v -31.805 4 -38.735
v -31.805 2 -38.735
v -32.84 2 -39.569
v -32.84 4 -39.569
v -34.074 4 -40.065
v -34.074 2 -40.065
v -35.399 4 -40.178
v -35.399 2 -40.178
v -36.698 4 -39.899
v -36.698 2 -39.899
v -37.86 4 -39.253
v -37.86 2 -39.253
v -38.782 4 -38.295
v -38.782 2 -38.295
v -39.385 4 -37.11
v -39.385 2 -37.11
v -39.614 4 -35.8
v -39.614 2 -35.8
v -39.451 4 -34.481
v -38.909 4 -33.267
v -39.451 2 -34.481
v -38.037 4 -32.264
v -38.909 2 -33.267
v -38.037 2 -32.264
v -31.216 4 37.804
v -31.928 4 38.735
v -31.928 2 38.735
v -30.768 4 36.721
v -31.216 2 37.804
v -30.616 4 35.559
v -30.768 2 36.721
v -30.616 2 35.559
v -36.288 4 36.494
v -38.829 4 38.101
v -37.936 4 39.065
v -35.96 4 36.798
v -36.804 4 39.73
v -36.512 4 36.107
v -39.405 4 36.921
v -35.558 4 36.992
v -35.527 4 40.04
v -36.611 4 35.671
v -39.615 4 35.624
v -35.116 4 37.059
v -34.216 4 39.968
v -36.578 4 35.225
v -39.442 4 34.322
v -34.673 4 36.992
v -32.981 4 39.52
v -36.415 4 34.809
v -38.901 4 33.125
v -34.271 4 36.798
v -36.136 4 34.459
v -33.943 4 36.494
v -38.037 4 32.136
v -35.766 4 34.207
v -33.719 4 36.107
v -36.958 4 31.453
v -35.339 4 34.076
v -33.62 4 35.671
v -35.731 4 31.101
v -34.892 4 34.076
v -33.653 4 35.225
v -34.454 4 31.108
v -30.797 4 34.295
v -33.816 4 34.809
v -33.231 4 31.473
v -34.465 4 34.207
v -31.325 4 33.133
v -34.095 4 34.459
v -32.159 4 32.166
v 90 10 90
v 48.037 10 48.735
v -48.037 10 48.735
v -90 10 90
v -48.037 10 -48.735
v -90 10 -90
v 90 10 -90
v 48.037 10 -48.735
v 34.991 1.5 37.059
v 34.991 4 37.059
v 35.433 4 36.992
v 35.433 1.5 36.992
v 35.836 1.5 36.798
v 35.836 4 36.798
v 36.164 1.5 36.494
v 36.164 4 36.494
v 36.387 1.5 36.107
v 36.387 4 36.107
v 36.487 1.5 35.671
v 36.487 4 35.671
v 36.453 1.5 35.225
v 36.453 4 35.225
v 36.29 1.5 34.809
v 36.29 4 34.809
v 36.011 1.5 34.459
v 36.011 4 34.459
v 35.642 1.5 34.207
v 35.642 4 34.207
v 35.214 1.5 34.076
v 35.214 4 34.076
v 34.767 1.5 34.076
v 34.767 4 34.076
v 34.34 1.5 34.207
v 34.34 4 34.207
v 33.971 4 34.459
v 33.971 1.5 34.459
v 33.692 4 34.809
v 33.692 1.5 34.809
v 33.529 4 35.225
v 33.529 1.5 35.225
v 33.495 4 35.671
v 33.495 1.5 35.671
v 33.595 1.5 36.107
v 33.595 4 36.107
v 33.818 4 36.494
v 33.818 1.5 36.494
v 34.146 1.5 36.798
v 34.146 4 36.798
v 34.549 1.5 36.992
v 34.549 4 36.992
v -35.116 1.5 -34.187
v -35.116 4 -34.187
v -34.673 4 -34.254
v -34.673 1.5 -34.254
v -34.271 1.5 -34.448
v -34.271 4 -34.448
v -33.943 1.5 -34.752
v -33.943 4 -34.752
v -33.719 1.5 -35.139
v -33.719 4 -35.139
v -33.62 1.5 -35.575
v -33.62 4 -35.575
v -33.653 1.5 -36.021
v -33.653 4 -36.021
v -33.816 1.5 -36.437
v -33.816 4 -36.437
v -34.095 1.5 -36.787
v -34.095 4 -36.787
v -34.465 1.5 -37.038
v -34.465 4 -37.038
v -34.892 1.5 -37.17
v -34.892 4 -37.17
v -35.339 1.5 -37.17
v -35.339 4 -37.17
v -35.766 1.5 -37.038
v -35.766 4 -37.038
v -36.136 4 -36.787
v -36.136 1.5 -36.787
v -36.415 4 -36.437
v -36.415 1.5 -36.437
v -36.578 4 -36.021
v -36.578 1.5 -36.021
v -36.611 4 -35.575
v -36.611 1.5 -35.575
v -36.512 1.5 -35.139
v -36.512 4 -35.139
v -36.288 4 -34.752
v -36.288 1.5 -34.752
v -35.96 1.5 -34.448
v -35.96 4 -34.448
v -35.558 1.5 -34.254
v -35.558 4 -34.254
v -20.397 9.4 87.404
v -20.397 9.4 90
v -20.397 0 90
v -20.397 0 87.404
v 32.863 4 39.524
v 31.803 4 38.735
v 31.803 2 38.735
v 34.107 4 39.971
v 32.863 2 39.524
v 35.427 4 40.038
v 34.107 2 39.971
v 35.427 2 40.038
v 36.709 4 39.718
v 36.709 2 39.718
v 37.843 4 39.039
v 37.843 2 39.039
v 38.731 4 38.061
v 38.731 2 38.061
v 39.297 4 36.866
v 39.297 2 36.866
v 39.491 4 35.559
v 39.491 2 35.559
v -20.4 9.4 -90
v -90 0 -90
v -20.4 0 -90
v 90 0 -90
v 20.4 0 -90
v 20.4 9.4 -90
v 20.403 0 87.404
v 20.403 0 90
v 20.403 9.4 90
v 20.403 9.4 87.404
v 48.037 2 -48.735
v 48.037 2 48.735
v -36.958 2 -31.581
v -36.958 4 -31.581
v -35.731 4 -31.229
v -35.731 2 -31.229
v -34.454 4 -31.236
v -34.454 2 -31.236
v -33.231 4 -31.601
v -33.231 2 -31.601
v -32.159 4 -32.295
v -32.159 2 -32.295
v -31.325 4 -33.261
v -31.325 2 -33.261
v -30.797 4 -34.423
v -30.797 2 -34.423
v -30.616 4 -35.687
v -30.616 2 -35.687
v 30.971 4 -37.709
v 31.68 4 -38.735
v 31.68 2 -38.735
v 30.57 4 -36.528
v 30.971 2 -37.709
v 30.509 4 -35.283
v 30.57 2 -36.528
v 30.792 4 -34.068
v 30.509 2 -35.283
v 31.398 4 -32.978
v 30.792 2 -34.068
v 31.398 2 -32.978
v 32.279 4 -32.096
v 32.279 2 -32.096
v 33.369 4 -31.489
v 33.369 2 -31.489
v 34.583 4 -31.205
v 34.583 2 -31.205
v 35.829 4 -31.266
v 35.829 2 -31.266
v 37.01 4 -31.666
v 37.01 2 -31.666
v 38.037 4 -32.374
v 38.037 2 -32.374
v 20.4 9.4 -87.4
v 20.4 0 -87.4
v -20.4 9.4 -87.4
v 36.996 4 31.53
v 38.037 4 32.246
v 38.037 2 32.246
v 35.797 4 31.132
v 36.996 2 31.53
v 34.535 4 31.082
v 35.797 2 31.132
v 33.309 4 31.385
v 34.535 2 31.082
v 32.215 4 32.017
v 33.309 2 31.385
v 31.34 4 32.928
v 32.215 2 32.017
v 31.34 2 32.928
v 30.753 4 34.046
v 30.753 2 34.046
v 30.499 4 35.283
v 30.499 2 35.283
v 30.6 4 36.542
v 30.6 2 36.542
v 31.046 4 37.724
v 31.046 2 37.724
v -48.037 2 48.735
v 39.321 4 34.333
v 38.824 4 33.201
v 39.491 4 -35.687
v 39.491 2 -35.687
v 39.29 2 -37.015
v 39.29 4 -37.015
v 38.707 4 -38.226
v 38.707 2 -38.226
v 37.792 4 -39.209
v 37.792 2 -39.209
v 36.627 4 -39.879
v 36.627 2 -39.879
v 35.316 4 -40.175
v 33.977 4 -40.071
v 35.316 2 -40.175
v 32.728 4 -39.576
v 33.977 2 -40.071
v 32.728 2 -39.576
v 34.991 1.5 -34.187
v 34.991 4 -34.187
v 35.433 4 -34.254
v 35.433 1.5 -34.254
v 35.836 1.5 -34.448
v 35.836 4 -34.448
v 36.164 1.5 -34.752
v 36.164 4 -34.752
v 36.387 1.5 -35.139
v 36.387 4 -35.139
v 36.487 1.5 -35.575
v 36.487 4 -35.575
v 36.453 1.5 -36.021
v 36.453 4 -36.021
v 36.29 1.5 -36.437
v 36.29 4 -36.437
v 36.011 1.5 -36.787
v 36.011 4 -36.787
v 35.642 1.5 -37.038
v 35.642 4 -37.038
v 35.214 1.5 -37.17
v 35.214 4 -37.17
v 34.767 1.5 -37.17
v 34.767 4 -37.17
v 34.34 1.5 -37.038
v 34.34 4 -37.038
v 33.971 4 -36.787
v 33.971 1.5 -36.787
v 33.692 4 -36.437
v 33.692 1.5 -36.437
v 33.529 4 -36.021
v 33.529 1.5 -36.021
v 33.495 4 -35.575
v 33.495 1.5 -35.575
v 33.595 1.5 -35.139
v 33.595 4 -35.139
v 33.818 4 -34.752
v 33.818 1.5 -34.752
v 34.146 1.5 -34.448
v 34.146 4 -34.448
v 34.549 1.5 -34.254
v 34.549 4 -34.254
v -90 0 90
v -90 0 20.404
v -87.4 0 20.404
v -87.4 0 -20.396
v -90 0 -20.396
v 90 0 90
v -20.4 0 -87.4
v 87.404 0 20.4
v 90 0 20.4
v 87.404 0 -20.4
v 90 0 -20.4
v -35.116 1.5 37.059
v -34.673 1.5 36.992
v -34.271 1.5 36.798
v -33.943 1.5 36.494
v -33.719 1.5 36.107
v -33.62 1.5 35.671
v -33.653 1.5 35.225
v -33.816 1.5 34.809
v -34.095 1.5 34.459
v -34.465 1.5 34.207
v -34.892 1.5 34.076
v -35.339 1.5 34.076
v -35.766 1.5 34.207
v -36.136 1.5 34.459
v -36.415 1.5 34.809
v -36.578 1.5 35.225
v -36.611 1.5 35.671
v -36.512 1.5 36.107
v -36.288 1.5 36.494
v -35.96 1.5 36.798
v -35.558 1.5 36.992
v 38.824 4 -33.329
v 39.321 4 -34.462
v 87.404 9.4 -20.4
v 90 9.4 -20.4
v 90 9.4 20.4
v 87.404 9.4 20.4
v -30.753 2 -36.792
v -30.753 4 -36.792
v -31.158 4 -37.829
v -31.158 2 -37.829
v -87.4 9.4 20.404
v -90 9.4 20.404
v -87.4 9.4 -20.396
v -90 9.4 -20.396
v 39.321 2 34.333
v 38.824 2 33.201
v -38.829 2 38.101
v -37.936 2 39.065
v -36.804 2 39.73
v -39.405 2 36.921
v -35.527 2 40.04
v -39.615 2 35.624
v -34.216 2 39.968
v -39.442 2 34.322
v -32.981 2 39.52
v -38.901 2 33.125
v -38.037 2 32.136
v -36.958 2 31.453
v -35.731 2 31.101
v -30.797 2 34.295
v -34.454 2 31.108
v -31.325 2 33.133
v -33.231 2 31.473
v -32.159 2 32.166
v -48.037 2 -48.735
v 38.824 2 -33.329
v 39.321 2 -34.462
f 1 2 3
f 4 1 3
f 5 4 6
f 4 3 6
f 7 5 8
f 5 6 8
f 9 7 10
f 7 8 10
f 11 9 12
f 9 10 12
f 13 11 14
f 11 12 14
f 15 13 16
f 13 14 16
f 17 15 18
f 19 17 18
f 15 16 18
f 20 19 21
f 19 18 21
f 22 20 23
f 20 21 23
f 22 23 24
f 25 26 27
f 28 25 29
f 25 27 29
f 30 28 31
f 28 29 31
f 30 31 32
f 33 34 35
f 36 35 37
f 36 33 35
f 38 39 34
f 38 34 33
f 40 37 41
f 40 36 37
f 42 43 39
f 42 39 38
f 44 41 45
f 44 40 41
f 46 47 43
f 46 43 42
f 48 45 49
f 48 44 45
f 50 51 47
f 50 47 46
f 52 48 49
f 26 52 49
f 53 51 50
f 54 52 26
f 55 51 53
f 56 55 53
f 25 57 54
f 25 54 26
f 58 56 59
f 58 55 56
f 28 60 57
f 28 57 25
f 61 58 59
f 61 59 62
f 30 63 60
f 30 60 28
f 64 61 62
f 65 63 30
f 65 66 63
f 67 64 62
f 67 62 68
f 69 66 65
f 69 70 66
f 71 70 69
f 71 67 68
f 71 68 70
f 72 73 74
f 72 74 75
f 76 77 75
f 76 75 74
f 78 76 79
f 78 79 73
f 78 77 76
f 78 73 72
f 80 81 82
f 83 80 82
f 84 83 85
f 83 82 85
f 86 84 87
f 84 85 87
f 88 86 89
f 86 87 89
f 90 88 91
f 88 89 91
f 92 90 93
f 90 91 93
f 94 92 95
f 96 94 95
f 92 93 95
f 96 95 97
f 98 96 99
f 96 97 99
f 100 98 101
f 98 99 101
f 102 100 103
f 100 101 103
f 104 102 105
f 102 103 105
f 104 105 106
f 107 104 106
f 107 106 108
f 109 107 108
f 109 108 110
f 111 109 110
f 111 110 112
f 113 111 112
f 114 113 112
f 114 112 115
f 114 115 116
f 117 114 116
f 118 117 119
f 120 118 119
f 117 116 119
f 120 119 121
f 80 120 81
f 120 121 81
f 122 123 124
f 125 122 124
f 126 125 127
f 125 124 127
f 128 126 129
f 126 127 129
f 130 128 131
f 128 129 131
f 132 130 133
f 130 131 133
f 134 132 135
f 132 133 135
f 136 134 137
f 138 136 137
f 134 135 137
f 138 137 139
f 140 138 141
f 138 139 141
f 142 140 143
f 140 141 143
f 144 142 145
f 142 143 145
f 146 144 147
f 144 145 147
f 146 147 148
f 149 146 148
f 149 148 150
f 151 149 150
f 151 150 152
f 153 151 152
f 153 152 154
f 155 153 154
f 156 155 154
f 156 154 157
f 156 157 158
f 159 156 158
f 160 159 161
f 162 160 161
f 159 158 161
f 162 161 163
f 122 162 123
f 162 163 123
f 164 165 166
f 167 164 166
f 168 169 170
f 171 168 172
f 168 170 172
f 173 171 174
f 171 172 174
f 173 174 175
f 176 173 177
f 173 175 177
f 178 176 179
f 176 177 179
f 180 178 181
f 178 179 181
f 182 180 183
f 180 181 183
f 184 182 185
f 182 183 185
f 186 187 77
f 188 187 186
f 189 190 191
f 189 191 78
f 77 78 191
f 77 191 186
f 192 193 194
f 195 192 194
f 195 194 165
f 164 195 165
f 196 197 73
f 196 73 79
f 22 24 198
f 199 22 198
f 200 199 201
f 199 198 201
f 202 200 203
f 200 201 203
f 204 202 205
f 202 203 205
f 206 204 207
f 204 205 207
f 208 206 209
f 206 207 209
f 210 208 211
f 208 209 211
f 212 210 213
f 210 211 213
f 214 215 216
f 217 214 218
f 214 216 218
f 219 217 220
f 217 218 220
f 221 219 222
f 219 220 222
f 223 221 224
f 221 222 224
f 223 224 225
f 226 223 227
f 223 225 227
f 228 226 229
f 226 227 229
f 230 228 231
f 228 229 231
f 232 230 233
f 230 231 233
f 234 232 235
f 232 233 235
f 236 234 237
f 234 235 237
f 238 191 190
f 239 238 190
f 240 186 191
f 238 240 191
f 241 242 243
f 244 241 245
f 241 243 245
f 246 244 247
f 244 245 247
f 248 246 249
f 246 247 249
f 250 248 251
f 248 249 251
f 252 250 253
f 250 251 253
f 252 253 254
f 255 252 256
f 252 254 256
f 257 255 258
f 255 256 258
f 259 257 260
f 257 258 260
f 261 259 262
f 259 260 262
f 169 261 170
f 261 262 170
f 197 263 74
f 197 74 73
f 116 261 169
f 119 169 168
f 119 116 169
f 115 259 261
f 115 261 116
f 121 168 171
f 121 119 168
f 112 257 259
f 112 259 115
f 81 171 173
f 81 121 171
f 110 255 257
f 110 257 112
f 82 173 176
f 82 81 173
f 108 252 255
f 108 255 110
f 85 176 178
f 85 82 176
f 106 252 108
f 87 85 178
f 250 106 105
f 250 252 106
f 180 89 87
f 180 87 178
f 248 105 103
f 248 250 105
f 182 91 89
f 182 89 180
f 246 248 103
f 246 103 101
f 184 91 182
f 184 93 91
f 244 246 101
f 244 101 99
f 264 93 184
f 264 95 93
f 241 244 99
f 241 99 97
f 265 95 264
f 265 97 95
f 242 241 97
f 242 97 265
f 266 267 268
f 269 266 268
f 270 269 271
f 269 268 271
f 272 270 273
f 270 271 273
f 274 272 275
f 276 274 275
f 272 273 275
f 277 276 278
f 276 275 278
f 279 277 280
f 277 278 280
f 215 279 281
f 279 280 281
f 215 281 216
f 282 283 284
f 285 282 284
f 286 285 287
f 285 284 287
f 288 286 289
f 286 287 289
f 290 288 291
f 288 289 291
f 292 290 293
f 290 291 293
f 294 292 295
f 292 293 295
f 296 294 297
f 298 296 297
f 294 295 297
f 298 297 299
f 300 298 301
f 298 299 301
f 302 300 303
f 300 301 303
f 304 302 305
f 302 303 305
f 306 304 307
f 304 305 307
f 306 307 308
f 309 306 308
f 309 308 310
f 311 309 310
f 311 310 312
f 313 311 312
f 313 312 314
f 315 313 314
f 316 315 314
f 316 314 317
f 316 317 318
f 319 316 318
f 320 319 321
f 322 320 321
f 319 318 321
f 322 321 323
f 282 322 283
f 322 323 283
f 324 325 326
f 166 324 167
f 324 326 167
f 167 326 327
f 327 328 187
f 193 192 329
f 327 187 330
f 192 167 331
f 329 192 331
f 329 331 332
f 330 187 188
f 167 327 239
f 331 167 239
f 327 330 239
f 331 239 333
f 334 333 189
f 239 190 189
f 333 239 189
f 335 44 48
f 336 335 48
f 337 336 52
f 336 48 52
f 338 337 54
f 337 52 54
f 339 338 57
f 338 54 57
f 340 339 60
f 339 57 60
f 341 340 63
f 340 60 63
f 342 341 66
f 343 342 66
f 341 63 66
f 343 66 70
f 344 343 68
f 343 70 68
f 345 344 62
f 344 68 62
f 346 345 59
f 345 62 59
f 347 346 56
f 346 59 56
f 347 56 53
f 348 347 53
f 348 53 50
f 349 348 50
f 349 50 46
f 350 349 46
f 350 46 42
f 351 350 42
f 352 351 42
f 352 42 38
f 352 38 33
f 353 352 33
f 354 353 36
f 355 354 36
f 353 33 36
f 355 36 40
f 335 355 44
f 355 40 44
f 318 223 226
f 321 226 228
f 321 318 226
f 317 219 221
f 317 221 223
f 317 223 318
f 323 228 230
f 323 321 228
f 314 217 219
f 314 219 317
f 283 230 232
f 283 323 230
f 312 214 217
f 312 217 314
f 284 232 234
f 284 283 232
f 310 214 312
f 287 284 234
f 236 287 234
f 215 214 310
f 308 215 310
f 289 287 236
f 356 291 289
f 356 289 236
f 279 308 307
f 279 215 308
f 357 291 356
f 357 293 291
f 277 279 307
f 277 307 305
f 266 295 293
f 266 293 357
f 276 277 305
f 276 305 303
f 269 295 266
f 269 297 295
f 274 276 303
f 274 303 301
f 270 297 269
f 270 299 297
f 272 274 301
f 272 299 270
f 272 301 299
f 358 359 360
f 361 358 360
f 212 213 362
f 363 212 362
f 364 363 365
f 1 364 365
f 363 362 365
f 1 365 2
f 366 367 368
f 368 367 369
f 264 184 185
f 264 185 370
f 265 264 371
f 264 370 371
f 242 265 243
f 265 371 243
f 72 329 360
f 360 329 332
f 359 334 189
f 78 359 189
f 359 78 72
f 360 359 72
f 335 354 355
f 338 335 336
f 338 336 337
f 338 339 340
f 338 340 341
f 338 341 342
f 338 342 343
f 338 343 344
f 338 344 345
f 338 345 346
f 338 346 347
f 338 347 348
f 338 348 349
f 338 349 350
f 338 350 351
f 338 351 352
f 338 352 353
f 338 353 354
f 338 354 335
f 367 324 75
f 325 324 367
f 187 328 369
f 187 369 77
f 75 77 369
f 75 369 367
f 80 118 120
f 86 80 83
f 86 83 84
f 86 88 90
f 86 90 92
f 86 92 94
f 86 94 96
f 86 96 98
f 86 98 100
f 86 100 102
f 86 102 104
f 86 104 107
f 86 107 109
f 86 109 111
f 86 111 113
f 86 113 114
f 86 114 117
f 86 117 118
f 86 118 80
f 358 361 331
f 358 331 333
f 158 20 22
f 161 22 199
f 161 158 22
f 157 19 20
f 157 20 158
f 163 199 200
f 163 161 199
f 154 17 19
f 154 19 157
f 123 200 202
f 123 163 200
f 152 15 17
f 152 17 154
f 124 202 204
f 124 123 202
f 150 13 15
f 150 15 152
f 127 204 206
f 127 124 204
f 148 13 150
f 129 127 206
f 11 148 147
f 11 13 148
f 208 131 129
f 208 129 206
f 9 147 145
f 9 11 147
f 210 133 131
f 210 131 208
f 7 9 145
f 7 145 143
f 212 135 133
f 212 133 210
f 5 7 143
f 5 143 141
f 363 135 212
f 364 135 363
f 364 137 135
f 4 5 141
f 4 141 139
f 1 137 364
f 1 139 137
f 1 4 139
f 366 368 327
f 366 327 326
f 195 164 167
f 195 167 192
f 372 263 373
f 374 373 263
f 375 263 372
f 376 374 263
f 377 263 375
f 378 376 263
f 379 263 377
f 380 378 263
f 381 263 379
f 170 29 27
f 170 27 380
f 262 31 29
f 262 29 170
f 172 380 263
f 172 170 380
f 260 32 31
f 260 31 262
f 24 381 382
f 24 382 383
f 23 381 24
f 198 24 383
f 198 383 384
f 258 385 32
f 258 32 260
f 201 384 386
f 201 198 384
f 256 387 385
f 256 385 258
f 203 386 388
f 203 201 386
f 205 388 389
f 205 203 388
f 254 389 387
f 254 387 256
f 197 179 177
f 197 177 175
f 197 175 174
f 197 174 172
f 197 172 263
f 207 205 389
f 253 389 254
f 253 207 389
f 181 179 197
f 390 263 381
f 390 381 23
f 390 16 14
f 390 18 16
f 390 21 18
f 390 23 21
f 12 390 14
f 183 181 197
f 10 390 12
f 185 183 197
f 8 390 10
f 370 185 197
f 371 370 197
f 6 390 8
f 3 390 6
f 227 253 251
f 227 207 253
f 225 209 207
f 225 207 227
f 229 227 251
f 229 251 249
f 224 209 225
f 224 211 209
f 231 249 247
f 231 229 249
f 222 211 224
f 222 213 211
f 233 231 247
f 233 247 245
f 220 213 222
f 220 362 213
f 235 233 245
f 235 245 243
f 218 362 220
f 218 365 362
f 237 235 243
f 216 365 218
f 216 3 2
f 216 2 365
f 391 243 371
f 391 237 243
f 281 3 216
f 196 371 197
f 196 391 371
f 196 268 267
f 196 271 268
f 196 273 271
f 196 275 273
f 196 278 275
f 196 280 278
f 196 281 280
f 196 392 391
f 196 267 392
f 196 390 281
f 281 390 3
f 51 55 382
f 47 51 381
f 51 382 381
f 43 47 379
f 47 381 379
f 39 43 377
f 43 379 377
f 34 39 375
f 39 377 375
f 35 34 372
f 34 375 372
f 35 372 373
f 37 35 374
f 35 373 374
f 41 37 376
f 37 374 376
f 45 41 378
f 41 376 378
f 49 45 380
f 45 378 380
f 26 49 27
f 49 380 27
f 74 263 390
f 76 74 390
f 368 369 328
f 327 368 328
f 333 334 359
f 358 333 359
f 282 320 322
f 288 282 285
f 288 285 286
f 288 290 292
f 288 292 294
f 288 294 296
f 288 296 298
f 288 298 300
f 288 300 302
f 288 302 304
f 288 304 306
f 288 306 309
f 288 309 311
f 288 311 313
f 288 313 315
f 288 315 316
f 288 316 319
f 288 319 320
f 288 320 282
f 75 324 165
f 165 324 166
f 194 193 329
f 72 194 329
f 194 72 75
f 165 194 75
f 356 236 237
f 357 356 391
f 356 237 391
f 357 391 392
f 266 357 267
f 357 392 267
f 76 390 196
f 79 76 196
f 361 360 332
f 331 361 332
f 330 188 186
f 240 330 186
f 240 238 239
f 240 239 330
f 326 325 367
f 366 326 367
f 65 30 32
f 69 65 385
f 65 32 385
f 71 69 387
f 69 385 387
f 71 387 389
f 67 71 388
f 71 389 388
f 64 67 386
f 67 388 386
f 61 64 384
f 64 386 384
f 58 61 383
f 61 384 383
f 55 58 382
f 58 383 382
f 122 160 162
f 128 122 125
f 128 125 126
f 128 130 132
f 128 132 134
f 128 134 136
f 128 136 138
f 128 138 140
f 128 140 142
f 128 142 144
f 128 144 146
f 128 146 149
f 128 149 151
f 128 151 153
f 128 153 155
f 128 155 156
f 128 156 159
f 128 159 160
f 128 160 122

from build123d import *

# Parameters (mm, degrees)
SKETCH1_W           = 180
SKETCH1_H           = 180
SKETCH1_W_2         = 96.073021888
SKETCH1_H_2         = 97.47003078
BOSS_EXTRUDE1_DEPTH = 10
SKETCH1_3_W         = 96.073021888
SKETCH1_3_H         = 97.47003078
SKETCH1_3_R         = 4.5
BOSS_EXTRUDE2_DEPTH = 2
SKETCH1_5_R         = 1.5
BOSS_EXTRUDE3_DEPTH = 4
CUT_EXTRUDE1_START  = 4
SKETCH1_6_R         = 1.5
CUT_EXTRUDE1_DEPTH  = 2.5
SKETCH4_W           = 40
SKETCH4_H           = 9
CUT_EXTRUDE3_DEPTH  = 2.6
CIRPATTERN2_COUNT   = 4


with BuildPart() as part:
    # Sketch1 → Boss-Extrude1 (new body)
    with BuildSketch(Plane(origin=(0, 0, 0), x_dir=(1, 0, 0), z_dir=(0, 1, 0))):
        Rectangle(SKETCH1_W, SKETCH1_H)
        Rectangle(SKETCH1_W_2, SKETCH1_H_2, mode=Mode.SUBTRACT)
    extrude(amount=BOSS_EXTRUDE1_DEPTH)

    # Sketch1<3> → Boss-Extrude2 (add)
    with BuildSketch(Plane(origin=(0, 0, 0), x_dir=(1, 0, 0), z_dir=(0, 1, 0))):
        Rectangle(SKETCH1_3_W, SKETCH1_3_H)
        with Locations(Location((34.990916942, 35.687000466, 0), (0, 0, 270))):
            Circle(SKETCH1_3_R, mode=Mode.SUBTRACT)
        with Locations(Location((34.990916942, -35.558880992, 0), (0, 0, 270))):
            Circle(SKETCH1_3_R, mode=Mode.SUBTRACT)
        with Locations(Location((-35.115505573, -35.558880992, 0), (0, 0, 270))):
            Circle(SKETCH1_3_R, mode=Mode.SUBTRACT)
        with Locations(Location((-35.115505573, 35.687000466, 0), (0, 0, 270))):
            Circle(SKETCH1_3_R, mode=Mode.SUBTRACT)
    extrude(amount=BOSS_EXTRUDE2_DEPTH)

    # Sketch1<5> → Boss-Extrude3 (add)
    # profile 1 of 12: a face of its own
    with BuildSketch(Plane(origin=(0, 0, 0), x_dir=(1, 0, 0), z_dir=(0, 1, 0))):
        with BuildLine():
            Line((-38.036510944, -38.73501539), (-38.036510944, -32.135764339))
            ThreePointArc((-38.036510944, -32.135764339), (-38.417826814, -38.615787014), (-31.927689662, -38.73501539))
            Line((-31.927689662, -38.73501539), (-38.036510944, -38.73501539))
        make_face()
    # profile 2 of 12: a face of its own
    with BuildSketch(Plane(origin=(0, 0, 0), x_dir=(1, 0, 0), z_dir=(0, 1, 0))):
        with BuildLine():
            ThreePointArc((-30.615505573, -35.558880992), (-33.230634778, -31.472652647), (-38.036510944, -32.135764339))
            Line((-38.036510944, -32.135764339), (-38.036510944, -38.73501539))
            Line((-38.036510944, -38.73501539), (-31.927689662, -38.73501539))
            ThreePointArc((-31.927689662, -38.73501539), (-30.95646893, -37.277140053), (-30.615505573, -35.558880992))
        make_face()
        with Locations((-35.115505573, -35.558880992)):
            Circle(SKETCH1_5_R, mode=Mode.SUBTRACT)
    # profile 3 of 12: a face of its own
    with BuildSketch(Plane(origin=(0, 0, 0), x_dir=(1, 0, 0), z_dir=(0, 1, 0))):
        with Locations((-35.115505573, -35.558880992)):
            Circle(SKETCH1_5_R)
    # profile 4 of 12: a face of its own
    with BuildSketch(Plane(origin=(0, 0, 0), x_dir=(1, 0, 0), z_dir=(0, 1, 0))):
        with BuildLine():
            Line((38.036510944, -38.73501539), (38.036510944, -32.246124259))
            ThreePointArc((38.036510944, -32.246124259), (31.745692174, -32.441427511), (31.80310103, -38.73501539))
            Line((31.80310103, -38.73501539), (38.036510944, -38.73501539))
        make_face()
        with Locations((34.990916942, -35.558880992)):
            Circle(SKETCH1_5_R, mode=Mode.SUBTRACT)
    # profile 5 of 12: a face of its own
    with BuildSketch(Plane(origin=(0, 0, 0), x_dir=(1, 0, 0), z_dir=(0, 1, 0))):
        with Locations((34.990916942, -35.558880992)):
            Circle(SKETCH1_5_R)
    # profile 6 of 12: a face of its own
    with BuildSketch(Plane(origin=(0, 0, 0), x_dir=(1, 0, 0), z_dir=(0, 1, 0))):
        with BuildLine():
            ThreePointArc((39.490916942, -35.558880992), (39.111303636, -33.74989965), (38.036510944, -32.246124259))
            Line((38.036510944, -32.246124259), (38.036510944, -38.73501539))
            Line((38.036510944, -38.73501539), (31.80310103, -38.73501539))
            ThreePointArc((31.80310103, -38.73501539), (36.709176002, -39.717917636), (39.490916942, -35.558880992))
        make_face()
    # profile 7 of 12: a face of its own
    with BuildSketch(Plane(origin=(0, 0, 0), x_dir=(1, 0, 0), z_dir=(0, 1, 0))):
        with BuildLine():
            Line((-31.804976156, 38.73501539), (-38.036510944, 38.73501539))
            Line((-38.036510944, 38.73501539), (-38.036510944, 32.263883812))
            ThreePointArc((-38.036510944, 32.263883812), (-33.230634778, 31.600772121), (-30.615505573, 35.687000466))
            ThreePointArc((-30.615505573, 35.687000466), (-30.923406912, 37.322943255), (-31.804976156, 38.73501539))
        make_face()
        with Locations((-35.115505573, 35.687000466)):
            Circle(SKETCH1_5_R, mode=Mode.SUBTRACT)
    # profile 8 of 12: a face of its own
    with BuildSketch(Plane(origin=(0, 0, 0), x_dir=(1, 0, 0), z_dir=(0, 1, 0))):
        with Locations((-35.115505573, 35.687000466)):
            Circle(SKETCH1_5_R)
    # profile 9 of 12: a face of its own
    with BuildSketch(Plane(origin=(0, 0, 0), x_dir=(1, 0, 0), z_dir=(0, 1, 0))):
        with BuildLine():
            Line((-38.036510944, 32.263883812), (-38.036510944, 38.73501539))
            Line((-38.036510944, 38.73501539), (-31.804976156, 38.73501539))
            ThreePointArc((-31.804976156, 38.73501539), (-38.356927826, 38.808407485), (-38.036510944, 32.263883812))
        make_face()
    # profile 10 of 12: a face of its own
    with BuildSketch(Plane(origin=(0, 0, 0), x_dir=(1, 0, 0), z_dir=(0, 1, 0))):
        with BuildLine():
            Line((38.036510944, 38.73501539), (31.680387525, 38.73501539))
            ThreePointArc((31.680387525, 38.73501539), (31.807773572, 32.50618323), (38.036510944, 32.374243733))
            Line((38.036510944, 32.374243733), (38.036510944, 38.73501539))
        make_face()
        with Locations((34.990916942, 35.687000466)):
            Circle(SKETCH1_5_R, mode=Mode.SUBTRACT)
    # profile 11 of 12: a face of its own
    with BuildSketch(Plane(origin=(0, 0, 0), x_dir=(1, 0, 0), z_dir=(0, 1, 0))):
        with Locations((34.990916942, 35.687000466)):
            Circle(SKETCH1_5_R)
    # profile 12 of 12: a face of its own
    with BuildSketch(Plane(origin=(0, 0, 0), x_dir=(1, 0, 0), z_dir=(0, 1, 0))):
        with BuildLine():
            ThreePointArc((39.490916942, 35.687000466), (36.626859732, 39.879099127), (31.680387525, 38.73501539))
            Line((31.680387525, 38.73501539), (38.036510944, 38.73501539))
            Line((38.036510944, 38.73501539), (38.036510944, 32.374243733))
            ThreePointArc((38.036510944, 32.374243733), (39.111303636, 33.878019124), (39.490916942, 35.687000466))
        make_face()
    extrude(amount=BOSS_EXTRUDE3_DEPTH)

    # Sketch1<6> → Cut-Extrude1 (cut)
    with BuildSketch(Plane(origin=(0, 0, 0), x_dir=(1, 0, 0), z_dir=(0, 1, 0)).offset(CUT_EXTRUDE1_START)):
        with Locations(Location((-35.115505573, 35.687000466, 0), (0, 0, 270))):
            Circle(SKETCH1_6_R)
        with Locations(Location((34.990916942, 35.687000466, 0), (0, 0, 270))):
            Circle(SKETCH1_6_R)
        with Locations(Location((34.990916942, -35.558880992, 0), (0, 0, 270))):
            Circle(SKETCH1_6_R)
        with Locations(Location((-35.115505573, -35.558880992, 0), (0, 0, 270))):
            Circle(SKETCH1_6_R)
    extrude(amount=-CUT_EXTRUDE1_DEPTH, mode=Mode.SUBTRACT)

    # Sketch4 → Cut-Extrude3 (cut)
    with BuildSketch(Plane(origin=(0, 0, -90), x_dir=(-1, 0, 0), z_dir=(0, 0, -1))):
        Polygon((-20, 0), (-20, 9), (20, 9), (20, 0), (20.4, 0), (20.4, 9.4), (-20.4, 9.4), (-20.4, 0), align=None)
        with Locations((0, 4.5)):
            Rectangle(SKETCH4_W, SKETCH4_H)
    cut_extrude3 = extrude(amount=-CUT_EXTRUDE3_DEPTH, mode=Mode.SUBTRACT)

    # CirPattern2: Cut-Extrude3 ×4 about axis
    cirpattern2_axis = Axis((0.001740107, 0, 0.001789421), (0, 1, 0))
    for i in range(1, CIRPATTERN2_COUNT):
        add(cut_extrude3.rotate(cirpattern2_axis, i * 360 / CIRPATTERN2_COUNT), mode=Mode.SUBTRACT)


solid = part.part
